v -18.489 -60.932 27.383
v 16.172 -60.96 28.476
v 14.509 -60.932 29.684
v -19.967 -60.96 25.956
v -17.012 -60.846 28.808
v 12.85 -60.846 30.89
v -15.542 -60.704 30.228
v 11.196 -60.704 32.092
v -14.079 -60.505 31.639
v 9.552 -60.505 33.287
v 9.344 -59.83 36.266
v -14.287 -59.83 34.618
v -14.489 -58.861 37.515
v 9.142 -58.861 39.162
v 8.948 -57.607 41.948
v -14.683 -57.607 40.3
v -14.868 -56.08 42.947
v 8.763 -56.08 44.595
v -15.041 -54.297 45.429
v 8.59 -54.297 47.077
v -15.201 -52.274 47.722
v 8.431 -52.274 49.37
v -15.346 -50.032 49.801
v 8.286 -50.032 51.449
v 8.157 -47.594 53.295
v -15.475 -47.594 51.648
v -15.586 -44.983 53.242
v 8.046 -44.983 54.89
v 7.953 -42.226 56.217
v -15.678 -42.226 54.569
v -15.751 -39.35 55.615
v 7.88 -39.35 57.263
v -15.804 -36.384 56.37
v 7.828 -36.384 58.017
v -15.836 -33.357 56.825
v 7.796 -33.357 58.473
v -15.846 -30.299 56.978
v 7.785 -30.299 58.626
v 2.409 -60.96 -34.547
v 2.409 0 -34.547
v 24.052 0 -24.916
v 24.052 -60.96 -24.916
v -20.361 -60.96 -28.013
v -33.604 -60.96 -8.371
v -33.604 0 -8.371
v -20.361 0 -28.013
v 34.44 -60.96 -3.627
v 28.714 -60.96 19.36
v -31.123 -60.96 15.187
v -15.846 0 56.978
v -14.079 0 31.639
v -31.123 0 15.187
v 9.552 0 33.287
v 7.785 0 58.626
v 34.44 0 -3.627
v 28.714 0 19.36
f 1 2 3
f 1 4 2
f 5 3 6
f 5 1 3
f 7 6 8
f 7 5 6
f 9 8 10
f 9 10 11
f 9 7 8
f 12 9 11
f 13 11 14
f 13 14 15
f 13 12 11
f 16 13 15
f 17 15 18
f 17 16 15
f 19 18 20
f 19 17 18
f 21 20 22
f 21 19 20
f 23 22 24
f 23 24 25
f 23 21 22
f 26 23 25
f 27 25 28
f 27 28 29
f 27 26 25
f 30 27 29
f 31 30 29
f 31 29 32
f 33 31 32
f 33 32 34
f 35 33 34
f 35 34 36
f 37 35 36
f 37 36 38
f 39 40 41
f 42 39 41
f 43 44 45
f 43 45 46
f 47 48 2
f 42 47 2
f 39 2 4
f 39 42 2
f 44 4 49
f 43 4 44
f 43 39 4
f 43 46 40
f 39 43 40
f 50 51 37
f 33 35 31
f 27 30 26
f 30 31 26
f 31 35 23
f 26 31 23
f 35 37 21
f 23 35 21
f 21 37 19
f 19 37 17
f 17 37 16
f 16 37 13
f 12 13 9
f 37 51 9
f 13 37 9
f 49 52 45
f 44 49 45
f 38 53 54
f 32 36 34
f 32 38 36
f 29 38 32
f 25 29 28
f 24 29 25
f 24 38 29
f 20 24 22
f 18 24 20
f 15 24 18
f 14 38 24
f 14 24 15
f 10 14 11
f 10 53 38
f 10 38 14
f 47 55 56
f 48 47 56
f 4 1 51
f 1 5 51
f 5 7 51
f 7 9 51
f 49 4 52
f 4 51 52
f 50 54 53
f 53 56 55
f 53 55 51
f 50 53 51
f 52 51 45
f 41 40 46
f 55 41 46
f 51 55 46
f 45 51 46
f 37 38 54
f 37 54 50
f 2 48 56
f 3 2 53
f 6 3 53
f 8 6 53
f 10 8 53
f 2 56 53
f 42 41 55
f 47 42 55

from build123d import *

# Parameters (mm, degrees)
F1_DEPTH = 60.96
F2_DEPTH = 25.4
F3_R     = 30.6605122421


with BuildPart() as f1:
    # F0 (on Front) → F1 (new body)
    with BuildSketch(Plane.XZ):
        Polygon((24.0515821646, -24.9158906195), (34.4402066399, -3.6266205457), (28.7138756682, 19.3595855869), (9.5520031521, 33.2872264655), (-14.0793577975, 31.6394041346), (-31.1228307591, 15.1871529763), (-33.6035853167, -8.371335846), (-20.3608488424, -28.0127835889), (2.4089550909, -34.5467385632), align=None)
    extrude(amount=F1_DEPTH)

    # F2 (add): a face of the model
    f2_faces = [f1.faces().sort_by_distance(p)[0] for p in [
        (-2.2636773227, -30.48, 32.4633153),
    ]]
    extrude(f2_faces, amount=F2_DEPTH)

    # F3
    f3_edges = [f1.edges().sort_by_distance(p)[0] for p in [
        (-4.030537, -60.96, 57.801788),
    ]]
    fillet(f3_edges, radius=F3_R)


solid = f1.part
